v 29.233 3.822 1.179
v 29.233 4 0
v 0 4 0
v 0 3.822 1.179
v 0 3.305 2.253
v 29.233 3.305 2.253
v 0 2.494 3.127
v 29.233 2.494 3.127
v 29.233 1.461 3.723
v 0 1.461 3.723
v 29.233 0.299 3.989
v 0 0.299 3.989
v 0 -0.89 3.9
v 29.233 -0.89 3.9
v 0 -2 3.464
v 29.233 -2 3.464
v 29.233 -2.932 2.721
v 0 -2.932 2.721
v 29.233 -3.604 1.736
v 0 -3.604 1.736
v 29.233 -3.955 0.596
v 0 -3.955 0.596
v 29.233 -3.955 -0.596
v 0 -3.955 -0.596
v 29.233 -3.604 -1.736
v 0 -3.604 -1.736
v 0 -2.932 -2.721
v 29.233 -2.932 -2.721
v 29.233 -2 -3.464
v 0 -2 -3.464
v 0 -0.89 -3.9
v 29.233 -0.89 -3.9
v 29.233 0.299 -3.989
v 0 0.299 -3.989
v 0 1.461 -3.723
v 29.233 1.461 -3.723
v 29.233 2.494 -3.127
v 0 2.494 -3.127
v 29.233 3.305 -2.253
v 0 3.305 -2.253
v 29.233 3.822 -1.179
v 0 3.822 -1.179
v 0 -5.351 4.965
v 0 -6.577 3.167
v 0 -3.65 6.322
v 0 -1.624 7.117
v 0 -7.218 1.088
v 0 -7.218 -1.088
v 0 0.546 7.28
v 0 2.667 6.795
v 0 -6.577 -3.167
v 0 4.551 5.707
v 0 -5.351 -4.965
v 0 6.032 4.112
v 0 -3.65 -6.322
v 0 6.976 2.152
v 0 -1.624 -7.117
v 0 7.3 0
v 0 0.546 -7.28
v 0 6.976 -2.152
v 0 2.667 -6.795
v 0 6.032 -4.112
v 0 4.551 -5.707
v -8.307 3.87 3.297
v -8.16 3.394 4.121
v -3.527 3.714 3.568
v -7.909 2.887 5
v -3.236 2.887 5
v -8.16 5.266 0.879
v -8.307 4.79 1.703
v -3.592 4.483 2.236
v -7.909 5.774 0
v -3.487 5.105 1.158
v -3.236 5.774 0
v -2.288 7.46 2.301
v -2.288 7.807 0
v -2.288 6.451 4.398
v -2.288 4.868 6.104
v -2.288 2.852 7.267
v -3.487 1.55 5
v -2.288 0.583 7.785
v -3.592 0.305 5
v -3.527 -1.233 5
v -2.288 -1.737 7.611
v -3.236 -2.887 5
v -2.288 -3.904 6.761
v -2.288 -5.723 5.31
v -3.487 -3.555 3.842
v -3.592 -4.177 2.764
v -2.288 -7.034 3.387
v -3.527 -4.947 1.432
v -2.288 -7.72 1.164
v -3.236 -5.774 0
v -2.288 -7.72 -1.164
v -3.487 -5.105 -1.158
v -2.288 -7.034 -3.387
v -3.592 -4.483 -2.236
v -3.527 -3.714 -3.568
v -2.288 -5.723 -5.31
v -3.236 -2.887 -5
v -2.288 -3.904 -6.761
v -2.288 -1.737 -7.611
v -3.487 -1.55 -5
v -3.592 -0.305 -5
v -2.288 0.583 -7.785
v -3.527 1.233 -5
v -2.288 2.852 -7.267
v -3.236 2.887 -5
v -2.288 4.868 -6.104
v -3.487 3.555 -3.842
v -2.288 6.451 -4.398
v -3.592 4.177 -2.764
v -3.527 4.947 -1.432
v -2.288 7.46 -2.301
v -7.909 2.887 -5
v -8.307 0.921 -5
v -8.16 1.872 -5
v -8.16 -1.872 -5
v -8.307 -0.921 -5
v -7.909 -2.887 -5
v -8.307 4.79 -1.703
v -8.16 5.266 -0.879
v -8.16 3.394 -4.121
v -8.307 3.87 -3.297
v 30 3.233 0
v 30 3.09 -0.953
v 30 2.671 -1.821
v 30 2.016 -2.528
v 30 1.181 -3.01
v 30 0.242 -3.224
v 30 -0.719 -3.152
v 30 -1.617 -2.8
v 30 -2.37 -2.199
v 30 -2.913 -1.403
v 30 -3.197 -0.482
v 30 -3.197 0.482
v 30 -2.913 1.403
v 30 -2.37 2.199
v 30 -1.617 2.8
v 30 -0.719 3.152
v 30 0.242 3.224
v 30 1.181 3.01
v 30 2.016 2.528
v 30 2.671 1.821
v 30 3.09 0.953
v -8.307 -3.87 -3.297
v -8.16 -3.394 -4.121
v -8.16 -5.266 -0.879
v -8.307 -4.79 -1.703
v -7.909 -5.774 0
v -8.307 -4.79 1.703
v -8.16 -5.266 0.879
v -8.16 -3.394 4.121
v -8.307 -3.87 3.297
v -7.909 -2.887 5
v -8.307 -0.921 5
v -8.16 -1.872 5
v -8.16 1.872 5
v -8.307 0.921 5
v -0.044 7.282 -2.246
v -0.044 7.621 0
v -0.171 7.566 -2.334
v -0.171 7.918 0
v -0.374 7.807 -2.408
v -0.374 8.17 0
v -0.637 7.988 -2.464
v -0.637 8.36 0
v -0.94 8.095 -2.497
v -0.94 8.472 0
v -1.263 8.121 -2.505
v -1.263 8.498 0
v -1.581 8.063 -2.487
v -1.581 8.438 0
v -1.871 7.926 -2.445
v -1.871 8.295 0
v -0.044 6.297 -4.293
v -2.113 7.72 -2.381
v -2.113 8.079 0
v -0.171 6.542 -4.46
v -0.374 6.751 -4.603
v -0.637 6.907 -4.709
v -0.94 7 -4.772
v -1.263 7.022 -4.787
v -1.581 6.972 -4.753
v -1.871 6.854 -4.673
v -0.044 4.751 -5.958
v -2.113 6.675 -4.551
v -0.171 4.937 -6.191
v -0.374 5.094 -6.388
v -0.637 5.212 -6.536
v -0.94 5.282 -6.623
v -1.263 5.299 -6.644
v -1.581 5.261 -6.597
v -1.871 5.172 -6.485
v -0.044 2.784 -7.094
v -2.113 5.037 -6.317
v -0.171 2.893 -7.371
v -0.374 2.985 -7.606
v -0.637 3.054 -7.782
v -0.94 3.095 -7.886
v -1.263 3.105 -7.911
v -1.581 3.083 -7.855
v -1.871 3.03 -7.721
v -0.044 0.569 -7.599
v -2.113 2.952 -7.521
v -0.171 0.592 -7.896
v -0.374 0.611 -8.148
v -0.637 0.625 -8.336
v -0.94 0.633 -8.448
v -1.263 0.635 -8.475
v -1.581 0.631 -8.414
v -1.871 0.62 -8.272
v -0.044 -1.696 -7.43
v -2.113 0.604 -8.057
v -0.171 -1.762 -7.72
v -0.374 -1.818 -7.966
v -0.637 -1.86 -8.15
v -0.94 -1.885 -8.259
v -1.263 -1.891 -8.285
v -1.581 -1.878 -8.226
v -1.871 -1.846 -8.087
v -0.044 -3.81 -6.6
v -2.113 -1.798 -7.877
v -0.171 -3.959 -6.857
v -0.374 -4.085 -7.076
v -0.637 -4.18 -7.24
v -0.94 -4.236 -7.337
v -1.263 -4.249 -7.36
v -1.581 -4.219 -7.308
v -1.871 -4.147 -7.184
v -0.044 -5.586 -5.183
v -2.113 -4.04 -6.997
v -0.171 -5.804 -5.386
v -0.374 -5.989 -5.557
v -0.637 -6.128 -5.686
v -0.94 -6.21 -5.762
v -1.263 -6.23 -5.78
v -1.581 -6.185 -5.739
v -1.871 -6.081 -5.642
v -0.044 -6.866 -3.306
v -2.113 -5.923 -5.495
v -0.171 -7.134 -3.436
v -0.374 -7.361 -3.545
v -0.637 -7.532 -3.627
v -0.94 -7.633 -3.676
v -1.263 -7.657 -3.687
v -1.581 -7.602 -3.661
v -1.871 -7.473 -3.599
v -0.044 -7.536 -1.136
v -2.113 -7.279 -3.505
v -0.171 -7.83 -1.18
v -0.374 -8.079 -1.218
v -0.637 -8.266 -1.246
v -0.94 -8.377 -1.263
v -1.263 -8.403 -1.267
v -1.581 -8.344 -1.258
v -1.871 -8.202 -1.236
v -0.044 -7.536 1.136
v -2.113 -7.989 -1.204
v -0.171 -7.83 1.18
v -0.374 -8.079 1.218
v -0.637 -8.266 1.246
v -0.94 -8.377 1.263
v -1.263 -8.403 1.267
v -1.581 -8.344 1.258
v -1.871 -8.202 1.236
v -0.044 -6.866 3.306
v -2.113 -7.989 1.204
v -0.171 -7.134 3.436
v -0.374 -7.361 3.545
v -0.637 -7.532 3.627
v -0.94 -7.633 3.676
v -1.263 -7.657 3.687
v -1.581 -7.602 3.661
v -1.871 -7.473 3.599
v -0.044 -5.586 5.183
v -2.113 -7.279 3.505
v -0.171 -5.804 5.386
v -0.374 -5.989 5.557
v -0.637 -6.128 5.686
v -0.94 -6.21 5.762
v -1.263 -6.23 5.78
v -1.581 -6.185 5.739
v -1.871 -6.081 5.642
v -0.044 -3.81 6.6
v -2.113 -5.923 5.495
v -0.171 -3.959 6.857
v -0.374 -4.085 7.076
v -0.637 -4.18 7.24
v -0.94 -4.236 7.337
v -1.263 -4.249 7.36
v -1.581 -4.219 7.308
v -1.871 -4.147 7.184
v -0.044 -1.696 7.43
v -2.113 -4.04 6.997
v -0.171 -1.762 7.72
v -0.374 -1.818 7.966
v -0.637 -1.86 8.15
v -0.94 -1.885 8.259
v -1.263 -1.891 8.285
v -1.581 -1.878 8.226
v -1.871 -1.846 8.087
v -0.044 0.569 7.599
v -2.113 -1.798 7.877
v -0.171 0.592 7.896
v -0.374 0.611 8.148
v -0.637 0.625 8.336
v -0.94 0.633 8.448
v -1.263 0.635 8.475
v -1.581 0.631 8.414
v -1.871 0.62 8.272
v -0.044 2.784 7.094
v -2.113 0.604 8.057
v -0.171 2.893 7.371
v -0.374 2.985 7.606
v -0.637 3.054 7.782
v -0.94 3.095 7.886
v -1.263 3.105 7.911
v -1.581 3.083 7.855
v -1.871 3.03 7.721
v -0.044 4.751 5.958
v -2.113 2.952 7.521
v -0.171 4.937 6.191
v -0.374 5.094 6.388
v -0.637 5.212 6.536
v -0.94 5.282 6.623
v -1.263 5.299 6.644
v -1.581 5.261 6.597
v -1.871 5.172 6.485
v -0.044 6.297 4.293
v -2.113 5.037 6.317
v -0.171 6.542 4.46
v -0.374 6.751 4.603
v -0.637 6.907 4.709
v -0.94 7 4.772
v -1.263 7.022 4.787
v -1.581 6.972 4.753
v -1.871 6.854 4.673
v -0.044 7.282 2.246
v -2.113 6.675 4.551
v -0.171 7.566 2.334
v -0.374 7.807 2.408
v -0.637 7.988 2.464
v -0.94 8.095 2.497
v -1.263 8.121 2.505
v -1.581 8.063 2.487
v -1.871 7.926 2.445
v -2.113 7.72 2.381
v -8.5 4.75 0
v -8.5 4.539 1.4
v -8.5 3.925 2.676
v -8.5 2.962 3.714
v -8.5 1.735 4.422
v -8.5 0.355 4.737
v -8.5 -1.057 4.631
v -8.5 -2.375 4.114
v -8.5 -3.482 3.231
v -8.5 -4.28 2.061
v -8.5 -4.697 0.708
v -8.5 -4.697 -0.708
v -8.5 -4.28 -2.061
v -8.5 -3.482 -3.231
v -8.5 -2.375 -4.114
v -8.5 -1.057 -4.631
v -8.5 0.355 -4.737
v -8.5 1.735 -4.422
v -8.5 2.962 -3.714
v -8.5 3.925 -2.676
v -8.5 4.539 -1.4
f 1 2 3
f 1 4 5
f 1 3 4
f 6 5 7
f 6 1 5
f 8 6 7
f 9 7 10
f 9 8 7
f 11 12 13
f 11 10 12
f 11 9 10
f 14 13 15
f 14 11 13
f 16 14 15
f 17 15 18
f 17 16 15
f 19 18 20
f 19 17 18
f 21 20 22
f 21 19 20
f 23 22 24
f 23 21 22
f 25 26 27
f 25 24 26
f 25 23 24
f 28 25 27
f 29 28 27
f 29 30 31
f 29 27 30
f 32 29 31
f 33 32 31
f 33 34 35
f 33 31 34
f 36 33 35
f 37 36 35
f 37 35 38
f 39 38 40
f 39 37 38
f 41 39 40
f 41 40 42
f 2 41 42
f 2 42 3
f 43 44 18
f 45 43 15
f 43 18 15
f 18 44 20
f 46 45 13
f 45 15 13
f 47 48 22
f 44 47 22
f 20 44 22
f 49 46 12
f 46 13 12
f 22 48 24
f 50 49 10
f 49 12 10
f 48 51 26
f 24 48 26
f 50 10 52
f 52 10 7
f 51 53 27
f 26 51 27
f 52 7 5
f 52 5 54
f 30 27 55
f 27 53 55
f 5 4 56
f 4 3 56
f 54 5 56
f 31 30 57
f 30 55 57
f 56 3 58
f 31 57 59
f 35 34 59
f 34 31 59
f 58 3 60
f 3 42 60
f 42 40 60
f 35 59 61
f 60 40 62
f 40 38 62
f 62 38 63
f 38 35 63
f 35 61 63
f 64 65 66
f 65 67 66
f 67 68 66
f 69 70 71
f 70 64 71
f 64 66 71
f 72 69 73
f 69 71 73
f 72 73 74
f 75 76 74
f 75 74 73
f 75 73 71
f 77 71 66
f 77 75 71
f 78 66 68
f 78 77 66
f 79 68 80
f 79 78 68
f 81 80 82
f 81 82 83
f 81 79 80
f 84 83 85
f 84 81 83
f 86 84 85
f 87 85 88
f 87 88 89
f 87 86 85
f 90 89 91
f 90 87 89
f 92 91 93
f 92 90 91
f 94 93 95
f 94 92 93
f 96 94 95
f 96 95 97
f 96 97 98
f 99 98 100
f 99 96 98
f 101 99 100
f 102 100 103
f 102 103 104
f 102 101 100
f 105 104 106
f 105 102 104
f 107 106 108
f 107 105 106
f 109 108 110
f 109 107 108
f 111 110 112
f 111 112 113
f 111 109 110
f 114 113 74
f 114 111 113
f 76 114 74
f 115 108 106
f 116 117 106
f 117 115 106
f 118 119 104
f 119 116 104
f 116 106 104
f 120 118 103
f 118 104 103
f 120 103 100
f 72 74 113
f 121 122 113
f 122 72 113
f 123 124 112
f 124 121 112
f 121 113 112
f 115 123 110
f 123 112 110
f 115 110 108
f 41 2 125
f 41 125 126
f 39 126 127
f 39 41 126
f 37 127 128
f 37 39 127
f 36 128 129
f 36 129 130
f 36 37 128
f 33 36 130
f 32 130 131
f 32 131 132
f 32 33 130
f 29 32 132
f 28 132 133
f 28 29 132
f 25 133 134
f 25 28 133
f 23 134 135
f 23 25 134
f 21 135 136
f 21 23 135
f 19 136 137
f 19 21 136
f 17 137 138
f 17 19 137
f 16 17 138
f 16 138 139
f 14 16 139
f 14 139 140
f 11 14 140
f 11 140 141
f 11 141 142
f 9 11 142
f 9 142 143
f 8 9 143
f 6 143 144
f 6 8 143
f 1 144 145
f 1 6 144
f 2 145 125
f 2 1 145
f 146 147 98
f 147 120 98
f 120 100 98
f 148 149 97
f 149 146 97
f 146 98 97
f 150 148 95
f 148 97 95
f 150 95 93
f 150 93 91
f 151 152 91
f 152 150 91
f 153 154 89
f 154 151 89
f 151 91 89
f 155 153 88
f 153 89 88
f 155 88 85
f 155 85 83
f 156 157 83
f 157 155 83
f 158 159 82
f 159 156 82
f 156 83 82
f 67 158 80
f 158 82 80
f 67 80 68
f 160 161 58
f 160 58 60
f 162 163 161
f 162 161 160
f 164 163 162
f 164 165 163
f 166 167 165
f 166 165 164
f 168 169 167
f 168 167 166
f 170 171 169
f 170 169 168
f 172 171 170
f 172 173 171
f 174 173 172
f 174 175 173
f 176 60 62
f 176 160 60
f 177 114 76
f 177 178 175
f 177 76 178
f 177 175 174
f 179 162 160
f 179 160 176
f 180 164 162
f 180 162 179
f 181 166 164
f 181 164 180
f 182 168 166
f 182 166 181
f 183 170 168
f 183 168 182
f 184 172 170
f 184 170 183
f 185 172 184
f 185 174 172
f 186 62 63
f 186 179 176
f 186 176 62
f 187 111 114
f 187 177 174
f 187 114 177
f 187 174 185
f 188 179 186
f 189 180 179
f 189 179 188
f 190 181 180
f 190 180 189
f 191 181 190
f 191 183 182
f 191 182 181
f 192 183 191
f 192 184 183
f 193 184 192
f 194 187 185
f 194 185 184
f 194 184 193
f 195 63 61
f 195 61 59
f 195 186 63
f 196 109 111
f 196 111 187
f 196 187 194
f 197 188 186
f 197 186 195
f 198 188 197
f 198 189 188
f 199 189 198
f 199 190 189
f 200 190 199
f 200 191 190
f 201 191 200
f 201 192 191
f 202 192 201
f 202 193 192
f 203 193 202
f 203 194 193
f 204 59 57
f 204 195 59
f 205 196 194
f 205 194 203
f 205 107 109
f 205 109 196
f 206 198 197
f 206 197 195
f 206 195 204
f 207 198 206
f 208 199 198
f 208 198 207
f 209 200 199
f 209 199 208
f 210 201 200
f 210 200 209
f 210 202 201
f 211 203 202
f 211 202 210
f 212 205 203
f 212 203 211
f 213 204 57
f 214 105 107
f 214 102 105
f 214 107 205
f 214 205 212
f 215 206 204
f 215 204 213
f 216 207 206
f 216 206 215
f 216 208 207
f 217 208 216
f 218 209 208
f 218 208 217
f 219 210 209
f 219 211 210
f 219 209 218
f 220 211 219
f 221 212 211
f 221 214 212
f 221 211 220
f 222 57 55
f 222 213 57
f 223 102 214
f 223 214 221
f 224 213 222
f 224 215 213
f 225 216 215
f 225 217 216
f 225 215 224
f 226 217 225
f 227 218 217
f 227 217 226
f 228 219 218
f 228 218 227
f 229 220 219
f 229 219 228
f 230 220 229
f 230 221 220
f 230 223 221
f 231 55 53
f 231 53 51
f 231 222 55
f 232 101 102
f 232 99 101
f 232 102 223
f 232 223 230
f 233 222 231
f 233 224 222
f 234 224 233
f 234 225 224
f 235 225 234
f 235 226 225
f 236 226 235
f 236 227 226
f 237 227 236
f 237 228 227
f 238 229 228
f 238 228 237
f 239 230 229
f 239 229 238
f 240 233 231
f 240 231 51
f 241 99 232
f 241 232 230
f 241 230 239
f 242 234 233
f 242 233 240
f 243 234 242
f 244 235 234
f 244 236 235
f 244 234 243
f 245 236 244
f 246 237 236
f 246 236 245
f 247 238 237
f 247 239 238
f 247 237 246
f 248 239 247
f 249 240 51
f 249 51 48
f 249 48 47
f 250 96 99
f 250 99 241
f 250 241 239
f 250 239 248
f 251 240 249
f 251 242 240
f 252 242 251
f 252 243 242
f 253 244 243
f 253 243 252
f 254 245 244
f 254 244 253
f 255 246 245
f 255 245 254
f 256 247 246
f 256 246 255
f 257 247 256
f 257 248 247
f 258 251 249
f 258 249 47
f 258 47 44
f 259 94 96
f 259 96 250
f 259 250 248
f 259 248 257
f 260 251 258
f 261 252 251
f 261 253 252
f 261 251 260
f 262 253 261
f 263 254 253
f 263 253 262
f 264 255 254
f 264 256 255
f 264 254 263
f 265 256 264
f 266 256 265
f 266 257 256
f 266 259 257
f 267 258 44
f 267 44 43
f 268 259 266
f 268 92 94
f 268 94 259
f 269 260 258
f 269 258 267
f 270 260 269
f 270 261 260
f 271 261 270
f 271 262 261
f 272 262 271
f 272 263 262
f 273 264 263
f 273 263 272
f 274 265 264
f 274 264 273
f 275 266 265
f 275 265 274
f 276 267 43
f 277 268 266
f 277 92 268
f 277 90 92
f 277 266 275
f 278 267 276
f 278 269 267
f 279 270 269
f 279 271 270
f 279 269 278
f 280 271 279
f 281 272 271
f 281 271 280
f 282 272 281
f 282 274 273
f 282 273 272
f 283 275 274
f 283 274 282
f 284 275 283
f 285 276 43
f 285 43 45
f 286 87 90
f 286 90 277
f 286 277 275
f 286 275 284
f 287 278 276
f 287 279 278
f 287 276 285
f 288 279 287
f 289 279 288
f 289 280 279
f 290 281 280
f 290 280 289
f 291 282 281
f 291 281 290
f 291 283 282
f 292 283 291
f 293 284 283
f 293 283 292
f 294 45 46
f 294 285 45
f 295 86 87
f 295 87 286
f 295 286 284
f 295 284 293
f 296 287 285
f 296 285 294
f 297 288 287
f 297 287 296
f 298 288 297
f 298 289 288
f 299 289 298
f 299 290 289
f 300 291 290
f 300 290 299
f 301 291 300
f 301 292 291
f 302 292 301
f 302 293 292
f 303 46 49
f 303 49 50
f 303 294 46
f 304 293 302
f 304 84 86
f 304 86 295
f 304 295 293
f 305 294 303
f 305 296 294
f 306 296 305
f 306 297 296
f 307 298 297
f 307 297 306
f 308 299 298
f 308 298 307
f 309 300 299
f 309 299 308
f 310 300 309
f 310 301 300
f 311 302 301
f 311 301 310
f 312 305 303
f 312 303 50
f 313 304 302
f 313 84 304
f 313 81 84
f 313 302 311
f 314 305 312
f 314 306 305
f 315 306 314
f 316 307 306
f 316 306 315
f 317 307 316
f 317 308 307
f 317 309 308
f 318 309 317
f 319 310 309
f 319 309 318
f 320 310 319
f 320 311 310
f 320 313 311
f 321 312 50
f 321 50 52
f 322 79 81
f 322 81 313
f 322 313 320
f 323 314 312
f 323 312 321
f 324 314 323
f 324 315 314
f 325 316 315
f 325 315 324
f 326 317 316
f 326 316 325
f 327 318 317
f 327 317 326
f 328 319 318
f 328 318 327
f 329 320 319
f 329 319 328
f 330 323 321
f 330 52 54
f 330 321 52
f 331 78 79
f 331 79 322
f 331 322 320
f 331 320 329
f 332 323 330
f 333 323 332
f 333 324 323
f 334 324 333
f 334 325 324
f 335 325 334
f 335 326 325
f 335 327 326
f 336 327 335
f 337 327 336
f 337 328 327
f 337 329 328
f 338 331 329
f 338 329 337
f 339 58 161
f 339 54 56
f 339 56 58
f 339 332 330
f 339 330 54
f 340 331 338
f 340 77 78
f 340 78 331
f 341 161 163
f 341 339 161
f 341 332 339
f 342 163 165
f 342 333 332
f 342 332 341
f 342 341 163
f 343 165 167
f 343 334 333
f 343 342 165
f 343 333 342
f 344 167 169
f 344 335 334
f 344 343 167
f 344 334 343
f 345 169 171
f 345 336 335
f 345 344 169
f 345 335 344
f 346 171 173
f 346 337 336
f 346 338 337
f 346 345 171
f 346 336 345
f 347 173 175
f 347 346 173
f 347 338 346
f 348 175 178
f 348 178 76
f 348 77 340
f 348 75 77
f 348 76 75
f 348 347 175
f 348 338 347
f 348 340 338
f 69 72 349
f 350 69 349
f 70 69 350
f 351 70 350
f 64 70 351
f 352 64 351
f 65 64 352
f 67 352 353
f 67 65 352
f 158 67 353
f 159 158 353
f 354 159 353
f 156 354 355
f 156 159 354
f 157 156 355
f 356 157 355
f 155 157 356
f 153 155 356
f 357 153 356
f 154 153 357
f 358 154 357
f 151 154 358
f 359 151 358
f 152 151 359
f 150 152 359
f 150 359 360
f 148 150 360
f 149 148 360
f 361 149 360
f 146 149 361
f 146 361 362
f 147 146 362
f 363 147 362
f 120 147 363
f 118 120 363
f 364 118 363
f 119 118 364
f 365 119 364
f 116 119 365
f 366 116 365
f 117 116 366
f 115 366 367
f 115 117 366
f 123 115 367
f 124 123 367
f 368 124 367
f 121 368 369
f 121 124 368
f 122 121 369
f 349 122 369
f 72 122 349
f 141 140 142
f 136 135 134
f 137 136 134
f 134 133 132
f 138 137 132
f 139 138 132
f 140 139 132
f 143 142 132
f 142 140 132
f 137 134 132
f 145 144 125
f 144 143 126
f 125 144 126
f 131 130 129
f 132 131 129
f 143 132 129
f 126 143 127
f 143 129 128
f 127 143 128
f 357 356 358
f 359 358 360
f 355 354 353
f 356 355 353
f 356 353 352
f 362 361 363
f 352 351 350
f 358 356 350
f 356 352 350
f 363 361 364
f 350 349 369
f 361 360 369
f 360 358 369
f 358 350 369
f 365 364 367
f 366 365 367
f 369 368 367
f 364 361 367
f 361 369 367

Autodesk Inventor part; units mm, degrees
ref_plane "YZ Plane" through (0, 0, 0) normal (1, 0, 0) x (0, 1, 0)
ref_plane "XZ Plane" through (0, 0, 0) normal (0, 1, 0) x (-1, 0, 0)
sketch "Sketch1" plane through (0, 0, 0) normal (0, 0, 1) x (1, 0, 0)
  line L0 (-3.825, 0) -> (-3.825, 4.5101)
  line L1 (0, 7.3) -> (0, 4)
  line L2 (8, 4) -> (30, 4)
  line L3 (30, 4) -> (30, 0)
  line L4 (30, 0) -> (-3.825, 0)
  arc A0 (0, 7.3) -> (-2.2876, 7.8071) centre (-1.2, 7.3) ccw
  line L5 (0, -1.745) -> (0, 10.4702) projected
  line L6 (-11.59, 0) -> (42.765, 0) projected
  line L7 (0, 4) -> (0.0001, 4)
  line L8 (0.0001, 4) -> (0.0001, 4)
  line L9 (0.0001, 4) -> (7.2332, 4)
  line L10 (7.2332, 4) -> (8, 4)
  line L11 (-3.825, 4.5101) -> (-2.2876, 7.8071)
  line L12 (0.0001, 4) -> (8, 4) construction
  line L13 (8, 4) -> (8, 0) construction
  dimension "d0" = 1.2
  dimension "d1" = 30
  dimension "d2" = 22
  dimension "d3" = 17
  dimension "d4" = 8
  dimension "d5" = 3.825
  dimension "d15" = 8
  dimension "d16" = 8
  dimension "d17" = 0.0001
  dimension "d18" = 0.7668
  dimension "d19" = 25
revolve "Body" add sketch "Sketch1" angle 360 about axis through (30, 0, 0) along (-1, 0, 0)
sketch "Sketch2" plane through (0, 0, 0) normal (1, 0, 0) x (0, 0, -1)
  line L0 (5, 2.8868) -> (5, -2.8868)
  line L1 (5, -2.8868) -> (0, -5.7735)
  line L2 (0, -5.7735) -> (-5, -2.8868)
  line L3 (-5, -2.8868) -> (-5, 2.8868)
  line L4 (-5, 2.8868) -> (0, 5.7735)
  line L5 (0, 5.7735) -> (5, 2.8868)
  point P0 (0, 0)
  point P1 (0, 0)
  dimension "d23" = 10
extrude "Head" add sketch "Sketch2" against normal blind 8.5
sketch "Sketch3" plane through (0, 0, 0) normal (0, 0, 1) x (1, 0, 0)
  line L0 (-8.5, 4.75) -> (-8.5, 5.7735)
  line L1 (-8.5, 5.7735) -> (-7.9091, 5.7735)
  line L2 (-7.9091, 5.7735) -> (-8.5, 4.75)
  line L3 (-9.5528, 0) -> (-2.183, 0) projected
  line L4 (-8.5, 5.7735) -> (-8.5, 2.8868) projected
  line L5 (-3.2359, 5.7735) -> (-8.5, 5.7735) projected
  point P0 (-8.5, 2.8868)
  dimension "d8" = 30
  dimension "d22" = 9.5
revolve "Chamfer1" cut sketch "Sketch3" angle 360 about axis through (-10, 0, 0) along (1, 0, 0)
thread "Thread" size "M8x1.25" class "6g" standard "ISO Metric profile" length 22
chamfer "Chamfer2" distance 0.7668 distance2 0.7668 1 edges at (30, -4, 0) measured on face at (30, 0.9825, 0.2422)
ref_plane "Work Plane1" through (10.95, 0, 0) normal (0, 0, -1) x (1, 0, 0)
equation "\"d0\" = PHH"
equation "\"d1\" = NLG"
equation "\"d2\" = GEL"
equation "\"d3\" = LADI"
equation "\"d4\" = GD"
equation "\"d5\" = 0.45 * KOH"
equation "\"d15\" = SD2"
equation "\"d16\" = BDM"
equation "\"d18\" = GAL"
equation "\"d19\" = KEWI"
equation "\"d23\" = SW"
equation "\"d6\" = KOH"
equation "\"d8\" = ANG1"
equation "\"d22\" = SW0"
equation "\"d10\" = GEL"
equation "\"d13\" = -0.5 * SPD + 0.5 * GD"
equation "\"d14\" = GUL"
equation "\"NLG\" = 30"
equation "\"GD\" = NND"
equation "\"BDM\" = NND"
equation "\"KOH\" = 8.5"
equation "\"GEL\" = 22"
equation "\"LADI\" = 17"
equation "\"SW\" = 10"
equation "\"PHH\" = RR"
equation "\"SW0\" = 9.5"
equation "\"SPD\" = NND - 1.2269 * PTC"
equation "\"SD2\" = NND"
equation "\"SD\" = 0"
equation "\"ANG1\" = 30deg"
equation "\"KEWI\" = 25deg"
equation "\"GAL\" = 0.61345 * PTC"
equation "\"GUL\" = 0.61345 * PTC"
equation "\"PTC\" = 1.25"
equation "\"THREADDIA\" = 8"
equation "\"E0\" = 1.155 * SW"
equation "\"TOA\" = 30deg"
equation "\"NND\" = 8"
equation "\"GD1\" = THREADDIA - 1.2269 * PTC"
equation "\"KOH1\" = 3.8"
equation "\"RR\" = 1.2"
properties part number "PWTR-0134" material "Stainless Steel"
